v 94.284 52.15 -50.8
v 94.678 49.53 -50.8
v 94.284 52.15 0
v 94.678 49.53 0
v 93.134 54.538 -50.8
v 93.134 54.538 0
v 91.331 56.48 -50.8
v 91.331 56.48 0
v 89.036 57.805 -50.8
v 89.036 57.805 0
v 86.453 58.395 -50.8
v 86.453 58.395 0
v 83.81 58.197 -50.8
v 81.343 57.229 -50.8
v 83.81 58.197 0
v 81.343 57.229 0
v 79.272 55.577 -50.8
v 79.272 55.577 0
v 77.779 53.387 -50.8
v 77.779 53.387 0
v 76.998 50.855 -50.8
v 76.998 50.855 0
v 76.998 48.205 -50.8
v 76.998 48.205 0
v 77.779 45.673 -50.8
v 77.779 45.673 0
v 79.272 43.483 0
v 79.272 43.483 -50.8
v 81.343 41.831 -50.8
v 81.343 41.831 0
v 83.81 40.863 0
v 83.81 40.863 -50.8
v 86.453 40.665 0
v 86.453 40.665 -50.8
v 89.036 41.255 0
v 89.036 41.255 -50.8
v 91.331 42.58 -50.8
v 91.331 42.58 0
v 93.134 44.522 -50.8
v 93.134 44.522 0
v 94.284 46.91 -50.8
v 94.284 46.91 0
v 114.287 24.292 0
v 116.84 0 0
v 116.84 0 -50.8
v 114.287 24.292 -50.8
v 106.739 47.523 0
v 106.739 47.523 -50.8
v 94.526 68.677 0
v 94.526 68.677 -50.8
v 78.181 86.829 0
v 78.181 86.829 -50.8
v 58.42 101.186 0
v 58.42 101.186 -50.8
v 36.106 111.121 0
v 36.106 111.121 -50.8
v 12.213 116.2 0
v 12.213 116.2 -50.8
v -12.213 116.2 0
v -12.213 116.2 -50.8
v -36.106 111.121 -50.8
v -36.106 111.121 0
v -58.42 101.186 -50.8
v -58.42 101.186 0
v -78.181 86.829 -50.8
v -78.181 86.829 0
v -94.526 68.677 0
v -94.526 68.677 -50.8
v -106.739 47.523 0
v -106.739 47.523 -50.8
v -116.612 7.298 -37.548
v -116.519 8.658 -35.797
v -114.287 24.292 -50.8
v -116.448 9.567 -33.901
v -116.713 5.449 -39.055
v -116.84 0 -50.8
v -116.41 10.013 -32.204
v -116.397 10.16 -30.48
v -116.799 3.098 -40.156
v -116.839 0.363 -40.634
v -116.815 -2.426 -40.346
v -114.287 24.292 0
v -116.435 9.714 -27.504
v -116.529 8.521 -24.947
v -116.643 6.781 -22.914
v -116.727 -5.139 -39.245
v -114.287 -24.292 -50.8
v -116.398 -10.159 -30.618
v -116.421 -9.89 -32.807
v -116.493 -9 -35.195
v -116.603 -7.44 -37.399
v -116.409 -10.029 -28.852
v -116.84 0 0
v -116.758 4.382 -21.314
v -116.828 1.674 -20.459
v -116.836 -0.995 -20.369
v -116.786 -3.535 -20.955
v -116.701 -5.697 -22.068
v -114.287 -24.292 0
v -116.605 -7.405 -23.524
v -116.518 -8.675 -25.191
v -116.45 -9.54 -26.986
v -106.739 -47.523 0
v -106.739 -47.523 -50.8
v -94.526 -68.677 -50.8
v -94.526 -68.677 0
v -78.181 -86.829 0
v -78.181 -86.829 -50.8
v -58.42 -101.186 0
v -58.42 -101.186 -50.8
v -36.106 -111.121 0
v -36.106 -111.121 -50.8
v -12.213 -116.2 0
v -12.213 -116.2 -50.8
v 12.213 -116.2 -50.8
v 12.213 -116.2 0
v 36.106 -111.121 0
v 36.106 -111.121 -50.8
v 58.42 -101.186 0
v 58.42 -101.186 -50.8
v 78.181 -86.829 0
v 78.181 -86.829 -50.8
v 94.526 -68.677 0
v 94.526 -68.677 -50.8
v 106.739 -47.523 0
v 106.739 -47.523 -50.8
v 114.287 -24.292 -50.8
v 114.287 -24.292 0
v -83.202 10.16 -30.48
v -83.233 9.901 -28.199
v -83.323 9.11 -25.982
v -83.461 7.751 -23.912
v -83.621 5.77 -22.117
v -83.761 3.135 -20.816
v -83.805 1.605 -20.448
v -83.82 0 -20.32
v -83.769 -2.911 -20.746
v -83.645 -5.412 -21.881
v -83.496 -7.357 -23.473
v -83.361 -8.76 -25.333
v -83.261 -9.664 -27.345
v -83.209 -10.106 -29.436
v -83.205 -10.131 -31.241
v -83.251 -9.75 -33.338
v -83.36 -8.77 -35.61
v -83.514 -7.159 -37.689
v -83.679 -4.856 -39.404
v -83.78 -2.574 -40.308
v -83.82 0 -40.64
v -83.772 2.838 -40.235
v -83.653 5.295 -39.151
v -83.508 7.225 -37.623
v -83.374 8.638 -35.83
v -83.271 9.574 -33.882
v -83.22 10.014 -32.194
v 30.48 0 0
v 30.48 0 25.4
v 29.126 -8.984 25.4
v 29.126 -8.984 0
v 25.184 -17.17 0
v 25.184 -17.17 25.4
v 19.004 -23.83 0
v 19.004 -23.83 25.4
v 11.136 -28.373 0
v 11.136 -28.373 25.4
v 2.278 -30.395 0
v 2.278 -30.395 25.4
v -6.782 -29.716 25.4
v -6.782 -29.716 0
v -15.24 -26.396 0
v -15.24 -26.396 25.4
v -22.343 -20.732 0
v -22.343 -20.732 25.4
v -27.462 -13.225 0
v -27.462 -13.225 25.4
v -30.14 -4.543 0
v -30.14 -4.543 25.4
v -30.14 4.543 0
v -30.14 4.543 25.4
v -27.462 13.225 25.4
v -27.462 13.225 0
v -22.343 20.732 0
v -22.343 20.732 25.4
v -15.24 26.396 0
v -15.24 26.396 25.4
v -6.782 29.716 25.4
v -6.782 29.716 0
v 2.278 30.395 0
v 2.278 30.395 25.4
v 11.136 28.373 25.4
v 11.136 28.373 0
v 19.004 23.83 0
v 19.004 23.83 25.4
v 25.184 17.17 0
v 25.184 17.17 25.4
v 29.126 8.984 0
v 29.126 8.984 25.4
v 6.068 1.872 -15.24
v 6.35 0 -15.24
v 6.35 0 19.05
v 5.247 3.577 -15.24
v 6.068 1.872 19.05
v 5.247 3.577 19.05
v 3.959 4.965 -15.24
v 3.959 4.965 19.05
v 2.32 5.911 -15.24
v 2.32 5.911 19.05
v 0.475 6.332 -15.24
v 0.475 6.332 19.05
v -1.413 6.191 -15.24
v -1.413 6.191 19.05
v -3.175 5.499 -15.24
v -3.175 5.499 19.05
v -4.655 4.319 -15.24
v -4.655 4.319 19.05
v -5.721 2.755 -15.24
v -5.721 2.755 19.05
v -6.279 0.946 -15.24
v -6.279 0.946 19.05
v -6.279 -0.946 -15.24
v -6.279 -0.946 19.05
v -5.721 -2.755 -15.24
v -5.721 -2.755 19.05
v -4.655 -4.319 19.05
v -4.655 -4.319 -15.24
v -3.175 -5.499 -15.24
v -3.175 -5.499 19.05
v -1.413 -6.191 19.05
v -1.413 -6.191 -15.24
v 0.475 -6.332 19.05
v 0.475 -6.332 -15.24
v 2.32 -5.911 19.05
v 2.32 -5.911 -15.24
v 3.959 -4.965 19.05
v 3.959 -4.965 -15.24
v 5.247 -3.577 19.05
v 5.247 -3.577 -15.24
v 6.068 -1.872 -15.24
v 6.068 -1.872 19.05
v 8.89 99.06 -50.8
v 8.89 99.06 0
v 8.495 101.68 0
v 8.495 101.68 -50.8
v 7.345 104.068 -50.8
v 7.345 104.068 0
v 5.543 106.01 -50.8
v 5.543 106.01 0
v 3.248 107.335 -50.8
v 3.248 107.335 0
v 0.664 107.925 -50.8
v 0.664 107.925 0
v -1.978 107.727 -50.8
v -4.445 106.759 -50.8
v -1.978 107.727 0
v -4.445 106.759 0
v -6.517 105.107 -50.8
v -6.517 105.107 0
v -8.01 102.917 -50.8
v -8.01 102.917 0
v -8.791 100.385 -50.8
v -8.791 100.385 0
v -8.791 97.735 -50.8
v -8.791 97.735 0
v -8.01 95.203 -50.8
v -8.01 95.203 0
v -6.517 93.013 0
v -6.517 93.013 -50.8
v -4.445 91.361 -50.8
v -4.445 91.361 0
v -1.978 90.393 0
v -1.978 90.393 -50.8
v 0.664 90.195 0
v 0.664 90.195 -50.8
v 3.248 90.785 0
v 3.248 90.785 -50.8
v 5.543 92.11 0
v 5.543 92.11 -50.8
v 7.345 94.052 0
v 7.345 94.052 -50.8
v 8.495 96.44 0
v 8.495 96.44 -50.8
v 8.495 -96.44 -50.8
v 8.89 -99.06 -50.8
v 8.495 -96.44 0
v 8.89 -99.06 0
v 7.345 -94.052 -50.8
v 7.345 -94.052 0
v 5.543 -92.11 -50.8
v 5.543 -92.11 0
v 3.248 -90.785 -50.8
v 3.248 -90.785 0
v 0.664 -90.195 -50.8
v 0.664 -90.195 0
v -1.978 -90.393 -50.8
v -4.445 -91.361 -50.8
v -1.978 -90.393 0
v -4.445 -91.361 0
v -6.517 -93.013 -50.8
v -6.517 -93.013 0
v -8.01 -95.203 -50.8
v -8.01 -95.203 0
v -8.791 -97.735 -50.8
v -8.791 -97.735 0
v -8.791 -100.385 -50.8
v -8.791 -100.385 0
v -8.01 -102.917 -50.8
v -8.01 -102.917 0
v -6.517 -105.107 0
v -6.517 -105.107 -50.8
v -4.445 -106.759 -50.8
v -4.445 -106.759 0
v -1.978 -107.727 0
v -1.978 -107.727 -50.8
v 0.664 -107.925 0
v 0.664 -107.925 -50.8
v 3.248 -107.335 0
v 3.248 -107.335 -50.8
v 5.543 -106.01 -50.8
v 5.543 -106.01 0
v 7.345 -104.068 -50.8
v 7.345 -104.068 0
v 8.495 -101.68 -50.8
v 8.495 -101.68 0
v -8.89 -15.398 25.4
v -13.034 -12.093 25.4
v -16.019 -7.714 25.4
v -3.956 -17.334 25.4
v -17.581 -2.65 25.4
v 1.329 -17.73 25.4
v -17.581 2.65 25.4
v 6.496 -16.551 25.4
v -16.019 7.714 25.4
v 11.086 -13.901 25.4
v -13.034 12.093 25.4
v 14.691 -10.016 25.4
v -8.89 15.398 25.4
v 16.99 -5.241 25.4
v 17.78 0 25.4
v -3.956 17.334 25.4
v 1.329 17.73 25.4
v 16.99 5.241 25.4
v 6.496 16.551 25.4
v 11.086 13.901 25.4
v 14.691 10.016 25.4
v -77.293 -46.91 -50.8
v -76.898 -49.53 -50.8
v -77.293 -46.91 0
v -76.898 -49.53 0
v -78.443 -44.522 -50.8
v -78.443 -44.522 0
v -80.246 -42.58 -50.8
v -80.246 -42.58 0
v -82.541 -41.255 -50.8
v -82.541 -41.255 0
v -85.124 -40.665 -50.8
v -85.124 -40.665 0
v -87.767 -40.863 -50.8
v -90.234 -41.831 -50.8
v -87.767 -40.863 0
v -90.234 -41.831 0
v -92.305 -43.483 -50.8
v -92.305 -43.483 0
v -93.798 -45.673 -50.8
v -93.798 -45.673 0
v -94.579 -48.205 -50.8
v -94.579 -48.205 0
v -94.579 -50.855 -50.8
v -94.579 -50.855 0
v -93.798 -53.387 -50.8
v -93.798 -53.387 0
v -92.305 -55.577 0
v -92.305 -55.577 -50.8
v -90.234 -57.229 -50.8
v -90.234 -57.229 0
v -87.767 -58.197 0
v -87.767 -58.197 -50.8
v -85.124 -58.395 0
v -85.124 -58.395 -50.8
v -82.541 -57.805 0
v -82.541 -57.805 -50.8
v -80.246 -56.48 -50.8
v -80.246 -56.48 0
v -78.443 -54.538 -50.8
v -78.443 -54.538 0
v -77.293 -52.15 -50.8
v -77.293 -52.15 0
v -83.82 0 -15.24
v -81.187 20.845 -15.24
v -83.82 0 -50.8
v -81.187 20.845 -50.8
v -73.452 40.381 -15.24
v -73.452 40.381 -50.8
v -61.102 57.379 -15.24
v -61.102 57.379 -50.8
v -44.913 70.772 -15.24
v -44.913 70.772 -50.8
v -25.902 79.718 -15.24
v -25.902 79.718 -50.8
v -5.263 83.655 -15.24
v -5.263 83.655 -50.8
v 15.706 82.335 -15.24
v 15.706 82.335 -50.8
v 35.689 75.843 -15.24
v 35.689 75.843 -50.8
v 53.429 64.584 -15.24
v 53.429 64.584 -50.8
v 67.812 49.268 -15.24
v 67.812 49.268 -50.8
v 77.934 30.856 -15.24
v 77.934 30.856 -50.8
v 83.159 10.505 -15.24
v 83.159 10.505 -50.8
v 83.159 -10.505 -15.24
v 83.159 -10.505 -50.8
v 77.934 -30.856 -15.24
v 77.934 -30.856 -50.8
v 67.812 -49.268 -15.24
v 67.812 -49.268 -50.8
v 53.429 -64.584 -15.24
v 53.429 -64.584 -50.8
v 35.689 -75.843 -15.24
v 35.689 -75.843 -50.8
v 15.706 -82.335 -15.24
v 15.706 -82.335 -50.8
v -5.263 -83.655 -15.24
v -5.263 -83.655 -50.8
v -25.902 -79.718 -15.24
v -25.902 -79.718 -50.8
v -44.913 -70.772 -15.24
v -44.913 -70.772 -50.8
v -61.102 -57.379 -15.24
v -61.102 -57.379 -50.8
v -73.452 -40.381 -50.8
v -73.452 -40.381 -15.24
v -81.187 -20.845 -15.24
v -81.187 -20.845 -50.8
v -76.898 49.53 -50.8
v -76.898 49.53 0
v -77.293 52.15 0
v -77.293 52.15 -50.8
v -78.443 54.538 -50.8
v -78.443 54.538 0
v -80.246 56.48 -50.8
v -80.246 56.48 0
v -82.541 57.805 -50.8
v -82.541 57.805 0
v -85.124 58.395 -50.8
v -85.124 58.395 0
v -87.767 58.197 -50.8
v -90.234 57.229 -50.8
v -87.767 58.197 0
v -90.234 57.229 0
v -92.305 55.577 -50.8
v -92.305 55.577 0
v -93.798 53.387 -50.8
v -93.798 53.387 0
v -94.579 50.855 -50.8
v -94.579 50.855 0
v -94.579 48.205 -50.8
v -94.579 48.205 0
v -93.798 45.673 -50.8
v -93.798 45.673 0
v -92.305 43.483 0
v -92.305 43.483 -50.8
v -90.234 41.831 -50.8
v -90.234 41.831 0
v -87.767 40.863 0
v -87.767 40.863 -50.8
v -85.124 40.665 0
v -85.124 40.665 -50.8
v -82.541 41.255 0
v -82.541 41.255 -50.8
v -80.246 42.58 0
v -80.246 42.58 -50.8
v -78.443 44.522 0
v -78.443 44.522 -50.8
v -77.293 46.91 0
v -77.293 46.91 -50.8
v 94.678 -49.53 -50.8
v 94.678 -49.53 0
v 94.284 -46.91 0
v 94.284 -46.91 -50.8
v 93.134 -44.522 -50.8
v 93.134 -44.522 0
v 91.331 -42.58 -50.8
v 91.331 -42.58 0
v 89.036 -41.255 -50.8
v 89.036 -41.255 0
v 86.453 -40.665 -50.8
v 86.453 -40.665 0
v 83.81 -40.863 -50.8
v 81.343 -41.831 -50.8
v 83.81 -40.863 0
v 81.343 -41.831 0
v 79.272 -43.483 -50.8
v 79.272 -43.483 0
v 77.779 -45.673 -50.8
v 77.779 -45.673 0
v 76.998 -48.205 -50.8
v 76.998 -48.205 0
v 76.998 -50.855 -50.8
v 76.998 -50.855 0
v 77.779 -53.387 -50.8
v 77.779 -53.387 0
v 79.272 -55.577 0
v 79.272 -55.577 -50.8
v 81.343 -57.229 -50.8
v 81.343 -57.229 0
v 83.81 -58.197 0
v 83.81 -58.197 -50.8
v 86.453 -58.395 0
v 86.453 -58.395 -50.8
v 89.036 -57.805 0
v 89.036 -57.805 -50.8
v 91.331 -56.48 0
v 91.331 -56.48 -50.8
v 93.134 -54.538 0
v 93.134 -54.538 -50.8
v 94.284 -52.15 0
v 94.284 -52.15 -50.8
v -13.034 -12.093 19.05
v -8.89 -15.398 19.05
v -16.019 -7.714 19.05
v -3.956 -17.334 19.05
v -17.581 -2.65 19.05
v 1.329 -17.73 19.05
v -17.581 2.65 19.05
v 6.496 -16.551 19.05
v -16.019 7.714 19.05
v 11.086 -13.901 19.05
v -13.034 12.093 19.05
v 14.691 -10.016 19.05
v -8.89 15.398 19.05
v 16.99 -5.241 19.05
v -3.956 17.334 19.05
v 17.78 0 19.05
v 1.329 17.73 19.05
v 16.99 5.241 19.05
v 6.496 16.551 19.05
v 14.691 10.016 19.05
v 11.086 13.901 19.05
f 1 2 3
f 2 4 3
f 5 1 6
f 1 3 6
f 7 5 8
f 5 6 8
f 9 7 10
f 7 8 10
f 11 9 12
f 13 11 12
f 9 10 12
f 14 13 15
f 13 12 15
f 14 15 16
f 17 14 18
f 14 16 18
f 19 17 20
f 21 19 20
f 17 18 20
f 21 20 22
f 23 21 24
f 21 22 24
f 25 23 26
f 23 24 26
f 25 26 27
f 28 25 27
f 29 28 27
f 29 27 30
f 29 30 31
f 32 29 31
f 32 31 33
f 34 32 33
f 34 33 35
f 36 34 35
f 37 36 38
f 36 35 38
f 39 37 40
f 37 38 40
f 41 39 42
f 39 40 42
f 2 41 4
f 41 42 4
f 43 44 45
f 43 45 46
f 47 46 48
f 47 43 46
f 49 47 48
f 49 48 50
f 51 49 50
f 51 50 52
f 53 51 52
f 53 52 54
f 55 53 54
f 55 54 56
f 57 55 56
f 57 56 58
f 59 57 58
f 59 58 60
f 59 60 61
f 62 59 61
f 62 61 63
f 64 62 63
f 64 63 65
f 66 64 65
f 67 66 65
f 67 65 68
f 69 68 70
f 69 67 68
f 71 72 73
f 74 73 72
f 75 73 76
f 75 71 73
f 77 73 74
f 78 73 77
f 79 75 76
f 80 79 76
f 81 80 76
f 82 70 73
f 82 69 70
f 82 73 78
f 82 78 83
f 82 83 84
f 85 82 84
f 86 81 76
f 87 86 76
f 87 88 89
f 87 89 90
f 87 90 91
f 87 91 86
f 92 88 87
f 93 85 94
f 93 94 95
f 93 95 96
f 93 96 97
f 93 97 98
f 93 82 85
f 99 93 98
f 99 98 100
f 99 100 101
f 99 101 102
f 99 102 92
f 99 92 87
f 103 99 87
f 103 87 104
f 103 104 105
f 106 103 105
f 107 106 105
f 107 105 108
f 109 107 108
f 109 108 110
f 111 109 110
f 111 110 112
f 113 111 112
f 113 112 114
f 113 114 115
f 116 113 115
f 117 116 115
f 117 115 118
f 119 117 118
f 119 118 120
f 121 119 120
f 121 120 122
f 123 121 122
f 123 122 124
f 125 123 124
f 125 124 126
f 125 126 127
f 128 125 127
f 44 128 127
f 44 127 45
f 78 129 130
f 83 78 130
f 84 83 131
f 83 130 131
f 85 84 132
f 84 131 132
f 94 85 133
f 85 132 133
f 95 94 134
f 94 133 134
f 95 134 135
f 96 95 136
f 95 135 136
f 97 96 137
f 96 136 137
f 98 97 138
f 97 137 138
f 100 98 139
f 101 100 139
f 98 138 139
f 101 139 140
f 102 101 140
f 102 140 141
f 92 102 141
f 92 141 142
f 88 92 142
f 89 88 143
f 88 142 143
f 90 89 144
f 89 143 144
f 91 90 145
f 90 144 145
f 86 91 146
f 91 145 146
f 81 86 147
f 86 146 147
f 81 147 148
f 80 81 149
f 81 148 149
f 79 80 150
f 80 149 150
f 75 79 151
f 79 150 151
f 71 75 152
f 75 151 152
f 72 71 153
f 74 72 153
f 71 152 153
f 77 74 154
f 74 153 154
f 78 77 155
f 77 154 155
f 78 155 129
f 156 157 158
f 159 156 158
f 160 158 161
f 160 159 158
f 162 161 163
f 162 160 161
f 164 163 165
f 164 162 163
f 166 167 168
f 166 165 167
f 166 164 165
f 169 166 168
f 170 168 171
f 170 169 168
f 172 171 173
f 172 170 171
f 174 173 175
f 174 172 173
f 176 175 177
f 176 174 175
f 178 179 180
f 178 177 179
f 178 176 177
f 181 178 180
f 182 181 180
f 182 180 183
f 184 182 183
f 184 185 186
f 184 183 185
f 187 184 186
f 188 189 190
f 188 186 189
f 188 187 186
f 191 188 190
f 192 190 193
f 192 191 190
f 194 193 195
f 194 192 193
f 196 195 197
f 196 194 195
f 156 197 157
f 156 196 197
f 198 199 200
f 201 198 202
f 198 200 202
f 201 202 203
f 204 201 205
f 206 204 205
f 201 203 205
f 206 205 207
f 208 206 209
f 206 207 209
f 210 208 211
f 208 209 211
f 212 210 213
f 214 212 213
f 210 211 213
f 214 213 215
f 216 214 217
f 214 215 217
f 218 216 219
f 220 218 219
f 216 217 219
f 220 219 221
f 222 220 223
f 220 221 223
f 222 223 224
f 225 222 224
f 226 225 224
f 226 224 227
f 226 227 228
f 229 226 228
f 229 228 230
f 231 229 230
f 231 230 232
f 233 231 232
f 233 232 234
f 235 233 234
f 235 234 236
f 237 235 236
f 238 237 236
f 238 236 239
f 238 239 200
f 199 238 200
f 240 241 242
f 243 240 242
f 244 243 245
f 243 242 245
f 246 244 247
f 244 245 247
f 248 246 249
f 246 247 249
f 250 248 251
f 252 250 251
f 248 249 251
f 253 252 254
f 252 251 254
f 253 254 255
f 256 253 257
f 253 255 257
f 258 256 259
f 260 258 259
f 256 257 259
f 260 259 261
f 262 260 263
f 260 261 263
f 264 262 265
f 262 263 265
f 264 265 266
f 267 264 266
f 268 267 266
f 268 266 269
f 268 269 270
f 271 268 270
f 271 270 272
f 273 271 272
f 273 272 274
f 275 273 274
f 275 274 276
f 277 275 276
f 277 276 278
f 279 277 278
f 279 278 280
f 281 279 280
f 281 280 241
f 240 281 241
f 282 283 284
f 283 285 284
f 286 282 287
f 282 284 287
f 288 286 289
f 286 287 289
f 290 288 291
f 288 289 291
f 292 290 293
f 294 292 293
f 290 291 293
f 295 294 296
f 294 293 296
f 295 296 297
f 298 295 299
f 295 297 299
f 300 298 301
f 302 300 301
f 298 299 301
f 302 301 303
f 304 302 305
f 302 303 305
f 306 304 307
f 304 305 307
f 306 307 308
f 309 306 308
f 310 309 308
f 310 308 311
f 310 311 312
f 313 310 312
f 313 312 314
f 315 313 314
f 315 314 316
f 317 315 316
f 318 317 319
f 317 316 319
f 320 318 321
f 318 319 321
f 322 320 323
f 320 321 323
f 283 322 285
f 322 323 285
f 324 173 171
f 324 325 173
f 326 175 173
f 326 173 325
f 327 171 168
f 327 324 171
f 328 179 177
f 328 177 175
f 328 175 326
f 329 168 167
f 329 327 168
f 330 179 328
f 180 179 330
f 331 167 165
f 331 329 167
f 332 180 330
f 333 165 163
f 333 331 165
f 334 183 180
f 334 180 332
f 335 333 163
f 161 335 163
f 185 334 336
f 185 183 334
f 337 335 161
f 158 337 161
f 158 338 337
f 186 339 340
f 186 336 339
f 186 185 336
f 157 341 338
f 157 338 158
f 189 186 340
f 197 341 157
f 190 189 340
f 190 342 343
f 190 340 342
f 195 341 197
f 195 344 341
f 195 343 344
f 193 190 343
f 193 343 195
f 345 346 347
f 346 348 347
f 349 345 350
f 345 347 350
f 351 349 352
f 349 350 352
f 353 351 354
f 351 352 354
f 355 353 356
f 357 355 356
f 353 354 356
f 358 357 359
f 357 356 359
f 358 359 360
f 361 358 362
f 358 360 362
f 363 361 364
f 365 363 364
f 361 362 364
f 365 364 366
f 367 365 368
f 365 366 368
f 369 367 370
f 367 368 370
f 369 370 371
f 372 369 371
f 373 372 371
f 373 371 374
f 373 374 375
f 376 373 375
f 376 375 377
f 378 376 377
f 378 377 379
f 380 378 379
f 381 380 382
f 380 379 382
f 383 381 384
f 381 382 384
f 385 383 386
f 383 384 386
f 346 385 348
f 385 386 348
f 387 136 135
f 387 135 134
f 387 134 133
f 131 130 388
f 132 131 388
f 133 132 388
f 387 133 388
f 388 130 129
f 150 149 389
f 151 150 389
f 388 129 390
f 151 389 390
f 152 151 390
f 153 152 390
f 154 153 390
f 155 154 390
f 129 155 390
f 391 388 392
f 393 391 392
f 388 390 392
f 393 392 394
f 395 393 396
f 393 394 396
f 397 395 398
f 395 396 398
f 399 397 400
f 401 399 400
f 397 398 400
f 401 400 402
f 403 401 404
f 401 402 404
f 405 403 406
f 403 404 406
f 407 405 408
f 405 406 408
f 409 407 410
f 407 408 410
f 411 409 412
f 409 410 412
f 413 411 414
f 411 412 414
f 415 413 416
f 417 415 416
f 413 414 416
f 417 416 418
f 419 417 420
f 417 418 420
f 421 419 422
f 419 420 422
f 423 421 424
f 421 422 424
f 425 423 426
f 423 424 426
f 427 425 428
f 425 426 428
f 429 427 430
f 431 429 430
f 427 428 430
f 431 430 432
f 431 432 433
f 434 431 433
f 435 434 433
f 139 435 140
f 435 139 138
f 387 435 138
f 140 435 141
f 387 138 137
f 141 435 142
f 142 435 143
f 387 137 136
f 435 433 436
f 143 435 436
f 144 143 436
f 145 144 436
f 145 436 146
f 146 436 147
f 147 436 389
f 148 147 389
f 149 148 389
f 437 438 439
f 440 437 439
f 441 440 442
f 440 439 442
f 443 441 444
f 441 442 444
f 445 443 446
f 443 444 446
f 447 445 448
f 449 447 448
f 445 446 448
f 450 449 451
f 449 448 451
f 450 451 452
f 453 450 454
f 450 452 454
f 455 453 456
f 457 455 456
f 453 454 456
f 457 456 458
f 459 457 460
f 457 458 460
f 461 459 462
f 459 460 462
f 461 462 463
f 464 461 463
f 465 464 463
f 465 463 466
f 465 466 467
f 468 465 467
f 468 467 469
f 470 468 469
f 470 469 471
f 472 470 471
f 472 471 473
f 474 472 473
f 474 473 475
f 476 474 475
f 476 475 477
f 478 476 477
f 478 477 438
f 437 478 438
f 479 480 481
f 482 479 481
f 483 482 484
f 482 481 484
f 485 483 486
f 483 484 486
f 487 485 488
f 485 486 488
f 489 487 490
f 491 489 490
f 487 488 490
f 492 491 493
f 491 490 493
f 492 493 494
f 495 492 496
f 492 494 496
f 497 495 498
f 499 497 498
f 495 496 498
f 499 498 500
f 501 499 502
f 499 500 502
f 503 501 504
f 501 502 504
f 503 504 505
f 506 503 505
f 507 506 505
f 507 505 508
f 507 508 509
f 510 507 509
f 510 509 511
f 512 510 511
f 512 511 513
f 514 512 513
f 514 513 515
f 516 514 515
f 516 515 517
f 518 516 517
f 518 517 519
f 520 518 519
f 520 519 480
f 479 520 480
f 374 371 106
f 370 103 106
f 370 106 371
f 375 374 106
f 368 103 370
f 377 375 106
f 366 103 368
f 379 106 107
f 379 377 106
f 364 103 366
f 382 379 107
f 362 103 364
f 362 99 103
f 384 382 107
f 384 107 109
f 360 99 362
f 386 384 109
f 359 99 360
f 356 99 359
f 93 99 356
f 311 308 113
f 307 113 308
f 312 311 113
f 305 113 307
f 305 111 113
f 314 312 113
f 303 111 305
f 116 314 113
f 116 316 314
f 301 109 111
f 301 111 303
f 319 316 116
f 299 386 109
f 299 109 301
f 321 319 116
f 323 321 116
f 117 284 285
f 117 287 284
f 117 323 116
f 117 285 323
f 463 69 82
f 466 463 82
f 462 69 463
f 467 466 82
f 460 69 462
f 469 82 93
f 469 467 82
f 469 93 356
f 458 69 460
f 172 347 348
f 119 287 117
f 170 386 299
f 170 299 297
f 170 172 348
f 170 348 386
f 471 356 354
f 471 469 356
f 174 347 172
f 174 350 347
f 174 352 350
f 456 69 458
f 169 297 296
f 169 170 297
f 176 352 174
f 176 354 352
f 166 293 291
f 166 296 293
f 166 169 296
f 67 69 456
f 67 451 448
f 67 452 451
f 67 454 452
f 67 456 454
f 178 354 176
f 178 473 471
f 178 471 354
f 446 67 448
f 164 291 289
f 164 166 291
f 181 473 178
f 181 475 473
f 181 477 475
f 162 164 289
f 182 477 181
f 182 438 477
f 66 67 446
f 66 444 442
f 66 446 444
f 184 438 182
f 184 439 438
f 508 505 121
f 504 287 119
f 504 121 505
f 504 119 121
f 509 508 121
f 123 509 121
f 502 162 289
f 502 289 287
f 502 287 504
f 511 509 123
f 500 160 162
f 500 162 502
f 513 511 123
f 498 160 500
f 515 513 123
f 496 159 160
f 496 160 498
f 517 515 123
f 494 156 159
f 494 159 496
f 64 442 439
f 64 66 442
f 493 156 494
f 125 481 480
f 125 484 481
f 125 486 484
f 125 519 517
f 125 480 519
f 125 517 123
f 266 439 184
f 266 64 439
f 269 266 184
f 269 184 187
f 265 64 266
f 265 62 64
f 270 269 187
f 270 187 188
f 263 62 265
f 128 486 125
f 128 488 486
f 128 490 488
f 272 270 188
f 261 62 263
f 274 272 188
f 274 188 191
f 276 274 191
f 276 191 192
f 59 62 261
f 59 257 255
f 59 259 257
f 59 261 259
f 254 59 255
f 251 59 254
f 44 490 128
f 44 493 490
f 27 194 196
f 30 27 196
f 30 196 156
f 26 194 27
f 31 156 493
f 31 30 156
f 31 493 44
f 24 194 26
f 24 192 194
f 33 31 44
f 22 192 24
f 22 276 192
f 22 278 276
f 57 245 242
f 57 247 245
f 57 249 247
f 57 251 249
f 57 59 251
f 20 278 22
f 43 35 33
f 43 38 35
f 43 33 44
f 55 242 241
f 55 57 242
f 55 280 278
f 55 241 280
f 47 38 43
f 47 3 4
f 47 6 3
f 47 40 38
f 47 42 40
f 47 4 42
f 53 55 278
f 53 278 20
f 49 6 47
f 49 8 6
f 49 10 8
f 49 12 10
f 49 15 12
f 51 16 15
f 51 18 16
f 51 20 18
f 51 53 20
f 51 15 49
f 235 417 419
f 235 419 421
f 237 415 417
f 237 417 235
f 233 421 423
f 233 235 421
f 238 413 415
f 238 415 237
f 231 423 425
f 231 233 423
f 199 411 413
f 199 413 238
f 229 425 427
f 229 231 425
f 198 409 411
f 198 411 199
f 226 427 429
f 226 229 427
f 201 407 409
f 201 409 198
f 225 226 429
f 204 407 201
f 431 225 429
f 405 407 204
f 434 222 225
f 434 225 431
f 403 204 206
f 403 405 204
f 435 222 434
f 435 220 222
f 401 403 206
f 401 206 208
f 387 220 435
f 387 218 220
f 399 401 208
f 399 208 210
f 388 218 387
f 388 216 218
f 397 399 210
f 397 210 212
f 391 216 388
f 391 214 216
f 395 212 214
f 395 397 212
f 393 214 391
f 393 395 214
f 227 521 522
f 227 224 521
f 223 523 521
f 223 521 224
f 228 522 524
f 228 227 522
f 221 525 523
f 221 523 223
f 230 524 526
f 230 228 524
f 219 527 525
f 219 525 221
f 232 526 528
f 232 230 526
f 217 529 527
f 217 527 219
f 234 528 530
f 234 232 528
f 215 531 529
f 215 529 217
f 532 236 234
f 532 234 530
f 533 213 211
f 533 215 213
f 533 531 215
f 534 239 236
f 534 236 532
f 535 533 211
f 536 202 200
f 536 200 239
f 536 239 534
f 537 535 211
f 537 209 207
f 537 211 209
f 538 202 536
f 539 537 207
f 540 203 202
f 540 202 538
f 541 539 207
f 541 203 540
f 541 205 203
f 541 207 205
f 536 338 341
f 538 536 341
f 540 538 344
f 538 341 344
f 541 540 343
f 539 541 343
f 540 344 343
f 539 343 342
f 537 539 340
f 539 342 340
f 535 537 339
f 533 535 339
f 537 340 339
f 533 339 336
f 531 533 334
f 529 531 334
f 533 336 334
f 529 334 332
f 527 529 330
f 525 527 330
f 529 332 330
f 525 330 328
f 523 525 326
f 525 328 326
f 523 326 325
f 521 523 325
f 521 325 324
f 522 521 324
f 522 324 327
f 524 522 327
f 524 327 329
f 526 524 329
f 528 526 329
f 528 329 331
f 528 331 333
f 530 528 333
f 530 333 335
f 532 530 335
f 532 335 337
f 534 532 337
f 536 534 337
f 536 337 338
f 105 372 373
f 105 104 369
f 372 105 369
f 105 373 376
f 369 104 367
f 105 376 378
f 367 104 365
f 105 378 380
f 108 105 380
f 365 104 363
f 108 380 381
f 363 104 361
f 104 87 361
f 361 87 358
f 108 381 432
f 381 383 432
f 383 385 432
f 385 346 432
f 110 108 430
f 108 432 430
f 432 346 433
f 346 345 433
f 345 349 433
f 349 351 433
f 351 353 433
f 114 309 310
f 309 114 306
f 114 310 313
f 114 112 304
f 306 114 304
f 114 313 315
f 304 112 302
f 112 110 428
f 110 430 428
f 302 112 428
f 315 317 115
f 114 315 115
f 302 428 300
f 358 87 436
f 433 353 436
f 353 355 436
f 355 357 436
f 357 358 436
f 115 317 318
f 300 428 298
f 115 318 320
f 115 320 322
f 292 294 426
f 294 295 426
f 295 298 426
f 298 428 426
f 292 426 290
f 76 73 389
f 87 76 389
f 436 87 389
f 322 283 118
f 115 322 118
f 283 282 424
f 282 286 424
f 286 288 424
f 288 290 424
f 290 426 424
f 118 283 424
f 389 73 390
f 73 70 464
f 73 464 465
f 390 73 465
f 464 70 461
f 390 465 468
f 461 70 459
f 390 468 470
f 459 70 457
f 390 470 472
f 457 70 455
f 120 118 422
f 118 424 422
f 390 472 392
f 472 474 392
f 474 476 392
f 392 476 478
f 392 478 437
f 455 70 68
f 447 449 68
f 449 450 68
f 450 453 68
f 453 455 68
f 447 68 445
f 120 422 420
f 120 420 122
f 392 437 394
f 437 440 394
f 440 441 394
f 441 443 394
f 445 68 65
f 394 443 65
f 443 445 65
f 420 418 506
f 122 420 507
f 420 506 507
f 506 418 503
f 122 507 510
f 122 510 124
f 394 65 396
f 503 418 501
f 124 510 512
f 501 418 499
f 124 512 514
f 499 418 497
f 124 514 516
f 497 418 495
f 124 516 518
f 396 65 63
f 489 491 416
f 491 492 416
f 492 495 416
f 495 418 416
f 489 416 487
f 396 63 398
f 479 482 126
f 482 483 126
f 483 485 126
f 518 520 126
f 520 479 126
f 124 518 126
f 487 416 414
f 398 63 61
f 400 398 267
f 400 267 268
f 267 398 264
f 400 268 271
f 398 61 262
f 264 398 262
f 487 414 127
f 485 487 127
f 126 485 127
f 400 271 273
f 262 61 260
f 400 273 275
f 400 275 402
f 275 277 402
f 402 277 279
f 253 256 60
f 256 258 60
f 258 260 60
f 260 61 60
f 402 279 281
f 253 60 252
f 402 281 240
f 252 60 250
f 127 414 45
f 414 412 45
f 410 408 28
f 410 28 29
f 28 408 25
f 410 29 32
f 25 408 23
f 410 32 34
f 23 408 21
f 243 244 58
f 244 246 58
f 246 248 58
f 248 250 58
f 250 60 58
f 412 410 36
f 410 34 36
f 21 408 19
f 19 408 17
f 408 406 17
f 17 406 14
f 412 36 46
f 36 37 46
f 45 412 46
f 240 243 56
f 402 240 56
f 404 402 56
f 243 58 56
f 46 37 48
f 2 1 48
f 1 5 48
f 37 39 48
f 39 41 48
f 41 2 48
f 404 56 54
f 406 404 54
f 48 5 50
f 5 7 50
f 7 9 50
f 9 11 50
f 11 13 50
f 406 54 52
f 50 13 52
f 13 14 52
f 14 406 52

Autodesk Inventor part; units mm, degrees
ref_plane "YZ Plane" through (0, 0, 0) normal (1, 0, 0) x (0, 1, 0)
ref_plane "XZ Plane" through (0, 0, 0) normal (0, 1, 0) x (-1, 0, 0)
ref_plane "XY Plane" through (0, 0, 0) normal (0, 0, 1) x (1, 0, 0)
sketch "Sketch1" plane through (0, 0, 0) normal (0, 0, 1) x (1, 0, 0)
  circle A0 centre (0, 0) radius 116.84
  circle A1 centre (0, 0) radius 30.48
  dimension "d0" = 233.68
  dimension "d1" = 60.96
extrude "Extrusion1" add sketch "Sketch1" against normal blind 50.8 contours A0 | A1
sketch "Sketch2" plane through (0, 0, 0) normal (0, 0, 1) x (1, 0, 0)
  circle A0 centre (0, 0) radius 30.48
  dimension "d4" = 60.96
extrude "Extrusion2" add sketch "Sketch2" along normal blind 25.4
sketch "Sketch3" plane through (0, 0, 25.4) normal (0, 0, 1) x (1, 0, 0)
  point P0 (0, 0)
sketch "Sketch4" plane through (0, 0, 25.4) normal (0, 0, 1) x (1, 0, 0)
  circle A0 centre (0, 0) radius 6.35
  circle A1 centre (0, 0) radius 17.78
  dimension "d7" = 12.7
  dimension "d8" = 35.56
extrude "Extrusion3" cut sketch "Sketch4" against normal blind 6.35 contours A0 | A1
extrude "Extrusion6" cut sketch "Sketch4" against normal through all contours A0
sketch "Sketch5" plane through (0, 0, -50.8) normal (0, 0, -1) x (-1, 0, 0)
  circle A0 centre (0, 0) radius 6.35 projected
  circle A1 centre (0, 0) radius 83.82
  dimension "d17" = 167.64
extrude "Extrusion7" cut sketch "Sketch5" against normal blind 35.56
sketch "Sketch7" plane through (0, 0, 0) normal (1, 0, 0) x (0, 1, 0)
  circle A0 centre (0, -30.48) radius 10.16
  line L0 (-116.84, -50.8) -> (116.84, -50.8) projected
  point P0 (0, 0)
  dimension "d20" = 20.32
  dimension "d21" = 20.32
extrude "Extrusion8" cut sketch "Sketch7" against normal through all
thread "Thread1" size "M8x1.25" class "6H" standard "ANSI Metric M Profile" full length
sketch "Sketch8" plane through (0, 0, 0) normal (0, 0, 1) x (1, 0, 0)
  point P0 (0, 0)
sketch "Sketch9" plane through (0, 0, 0) normal (0, 0, 1) x (1, 0, 0)
  circle A0 centre (0, 0) radius 6.35 construction
  circle A1 centre (0, 0) radius 99.06 construction
  line L0 (0, 0) -> (-123.6027, 71.3621) construction
  line L1 (0, 0) -> (-132.0824, -76.2578) construction
  line L2 (-189.6994, 0) -> (167.9299, 0) construction
  circle A2 centre (-85.7885, 49.53) radius 8.89
  circle A3 centre (-85.7885, -49.53) radius 8.89
  circle A4 centre (0, -99.06) radius 8.89
  circle A5 centre (85.7885, -49.53) radius 8.89
  circle A6 centre (85.7885, 49.53) radius 8.89
  circle A7 centre (0, 99.06) radius 8.89
  dimension "d26" = 198.12
  dimension "d27" = 60
  dimension "d28" = 17.78
  dimension "d31" = 360
extrude "Extrusion9" cut sketch "Sketch9" against normal through all
thread "Thread2" size "M8x1.25" class "6H" standard "ANSI Metric M Profile" full length
equation "\"BendRadius\" = Thickness"
equation "\"BendReliefWidth\" = Thickness"
equation "\"BendReliefDepth\" = 0.5 * Thickness"
equation "\"CornerReliefSize\" = 4 * Thickness"
equation "\"MinimumRemnant\" = 2 * Thickness"
equation "\"TransitionRadius\" = BendRadius"
equation "\"JacobiRadiusSize\" = BendRadius"
equation "\"GapSize\" = Thickness"
equation "\"Thickness\" = 3.048"
properties part number "valve housing" material "Aluminum 6061"
